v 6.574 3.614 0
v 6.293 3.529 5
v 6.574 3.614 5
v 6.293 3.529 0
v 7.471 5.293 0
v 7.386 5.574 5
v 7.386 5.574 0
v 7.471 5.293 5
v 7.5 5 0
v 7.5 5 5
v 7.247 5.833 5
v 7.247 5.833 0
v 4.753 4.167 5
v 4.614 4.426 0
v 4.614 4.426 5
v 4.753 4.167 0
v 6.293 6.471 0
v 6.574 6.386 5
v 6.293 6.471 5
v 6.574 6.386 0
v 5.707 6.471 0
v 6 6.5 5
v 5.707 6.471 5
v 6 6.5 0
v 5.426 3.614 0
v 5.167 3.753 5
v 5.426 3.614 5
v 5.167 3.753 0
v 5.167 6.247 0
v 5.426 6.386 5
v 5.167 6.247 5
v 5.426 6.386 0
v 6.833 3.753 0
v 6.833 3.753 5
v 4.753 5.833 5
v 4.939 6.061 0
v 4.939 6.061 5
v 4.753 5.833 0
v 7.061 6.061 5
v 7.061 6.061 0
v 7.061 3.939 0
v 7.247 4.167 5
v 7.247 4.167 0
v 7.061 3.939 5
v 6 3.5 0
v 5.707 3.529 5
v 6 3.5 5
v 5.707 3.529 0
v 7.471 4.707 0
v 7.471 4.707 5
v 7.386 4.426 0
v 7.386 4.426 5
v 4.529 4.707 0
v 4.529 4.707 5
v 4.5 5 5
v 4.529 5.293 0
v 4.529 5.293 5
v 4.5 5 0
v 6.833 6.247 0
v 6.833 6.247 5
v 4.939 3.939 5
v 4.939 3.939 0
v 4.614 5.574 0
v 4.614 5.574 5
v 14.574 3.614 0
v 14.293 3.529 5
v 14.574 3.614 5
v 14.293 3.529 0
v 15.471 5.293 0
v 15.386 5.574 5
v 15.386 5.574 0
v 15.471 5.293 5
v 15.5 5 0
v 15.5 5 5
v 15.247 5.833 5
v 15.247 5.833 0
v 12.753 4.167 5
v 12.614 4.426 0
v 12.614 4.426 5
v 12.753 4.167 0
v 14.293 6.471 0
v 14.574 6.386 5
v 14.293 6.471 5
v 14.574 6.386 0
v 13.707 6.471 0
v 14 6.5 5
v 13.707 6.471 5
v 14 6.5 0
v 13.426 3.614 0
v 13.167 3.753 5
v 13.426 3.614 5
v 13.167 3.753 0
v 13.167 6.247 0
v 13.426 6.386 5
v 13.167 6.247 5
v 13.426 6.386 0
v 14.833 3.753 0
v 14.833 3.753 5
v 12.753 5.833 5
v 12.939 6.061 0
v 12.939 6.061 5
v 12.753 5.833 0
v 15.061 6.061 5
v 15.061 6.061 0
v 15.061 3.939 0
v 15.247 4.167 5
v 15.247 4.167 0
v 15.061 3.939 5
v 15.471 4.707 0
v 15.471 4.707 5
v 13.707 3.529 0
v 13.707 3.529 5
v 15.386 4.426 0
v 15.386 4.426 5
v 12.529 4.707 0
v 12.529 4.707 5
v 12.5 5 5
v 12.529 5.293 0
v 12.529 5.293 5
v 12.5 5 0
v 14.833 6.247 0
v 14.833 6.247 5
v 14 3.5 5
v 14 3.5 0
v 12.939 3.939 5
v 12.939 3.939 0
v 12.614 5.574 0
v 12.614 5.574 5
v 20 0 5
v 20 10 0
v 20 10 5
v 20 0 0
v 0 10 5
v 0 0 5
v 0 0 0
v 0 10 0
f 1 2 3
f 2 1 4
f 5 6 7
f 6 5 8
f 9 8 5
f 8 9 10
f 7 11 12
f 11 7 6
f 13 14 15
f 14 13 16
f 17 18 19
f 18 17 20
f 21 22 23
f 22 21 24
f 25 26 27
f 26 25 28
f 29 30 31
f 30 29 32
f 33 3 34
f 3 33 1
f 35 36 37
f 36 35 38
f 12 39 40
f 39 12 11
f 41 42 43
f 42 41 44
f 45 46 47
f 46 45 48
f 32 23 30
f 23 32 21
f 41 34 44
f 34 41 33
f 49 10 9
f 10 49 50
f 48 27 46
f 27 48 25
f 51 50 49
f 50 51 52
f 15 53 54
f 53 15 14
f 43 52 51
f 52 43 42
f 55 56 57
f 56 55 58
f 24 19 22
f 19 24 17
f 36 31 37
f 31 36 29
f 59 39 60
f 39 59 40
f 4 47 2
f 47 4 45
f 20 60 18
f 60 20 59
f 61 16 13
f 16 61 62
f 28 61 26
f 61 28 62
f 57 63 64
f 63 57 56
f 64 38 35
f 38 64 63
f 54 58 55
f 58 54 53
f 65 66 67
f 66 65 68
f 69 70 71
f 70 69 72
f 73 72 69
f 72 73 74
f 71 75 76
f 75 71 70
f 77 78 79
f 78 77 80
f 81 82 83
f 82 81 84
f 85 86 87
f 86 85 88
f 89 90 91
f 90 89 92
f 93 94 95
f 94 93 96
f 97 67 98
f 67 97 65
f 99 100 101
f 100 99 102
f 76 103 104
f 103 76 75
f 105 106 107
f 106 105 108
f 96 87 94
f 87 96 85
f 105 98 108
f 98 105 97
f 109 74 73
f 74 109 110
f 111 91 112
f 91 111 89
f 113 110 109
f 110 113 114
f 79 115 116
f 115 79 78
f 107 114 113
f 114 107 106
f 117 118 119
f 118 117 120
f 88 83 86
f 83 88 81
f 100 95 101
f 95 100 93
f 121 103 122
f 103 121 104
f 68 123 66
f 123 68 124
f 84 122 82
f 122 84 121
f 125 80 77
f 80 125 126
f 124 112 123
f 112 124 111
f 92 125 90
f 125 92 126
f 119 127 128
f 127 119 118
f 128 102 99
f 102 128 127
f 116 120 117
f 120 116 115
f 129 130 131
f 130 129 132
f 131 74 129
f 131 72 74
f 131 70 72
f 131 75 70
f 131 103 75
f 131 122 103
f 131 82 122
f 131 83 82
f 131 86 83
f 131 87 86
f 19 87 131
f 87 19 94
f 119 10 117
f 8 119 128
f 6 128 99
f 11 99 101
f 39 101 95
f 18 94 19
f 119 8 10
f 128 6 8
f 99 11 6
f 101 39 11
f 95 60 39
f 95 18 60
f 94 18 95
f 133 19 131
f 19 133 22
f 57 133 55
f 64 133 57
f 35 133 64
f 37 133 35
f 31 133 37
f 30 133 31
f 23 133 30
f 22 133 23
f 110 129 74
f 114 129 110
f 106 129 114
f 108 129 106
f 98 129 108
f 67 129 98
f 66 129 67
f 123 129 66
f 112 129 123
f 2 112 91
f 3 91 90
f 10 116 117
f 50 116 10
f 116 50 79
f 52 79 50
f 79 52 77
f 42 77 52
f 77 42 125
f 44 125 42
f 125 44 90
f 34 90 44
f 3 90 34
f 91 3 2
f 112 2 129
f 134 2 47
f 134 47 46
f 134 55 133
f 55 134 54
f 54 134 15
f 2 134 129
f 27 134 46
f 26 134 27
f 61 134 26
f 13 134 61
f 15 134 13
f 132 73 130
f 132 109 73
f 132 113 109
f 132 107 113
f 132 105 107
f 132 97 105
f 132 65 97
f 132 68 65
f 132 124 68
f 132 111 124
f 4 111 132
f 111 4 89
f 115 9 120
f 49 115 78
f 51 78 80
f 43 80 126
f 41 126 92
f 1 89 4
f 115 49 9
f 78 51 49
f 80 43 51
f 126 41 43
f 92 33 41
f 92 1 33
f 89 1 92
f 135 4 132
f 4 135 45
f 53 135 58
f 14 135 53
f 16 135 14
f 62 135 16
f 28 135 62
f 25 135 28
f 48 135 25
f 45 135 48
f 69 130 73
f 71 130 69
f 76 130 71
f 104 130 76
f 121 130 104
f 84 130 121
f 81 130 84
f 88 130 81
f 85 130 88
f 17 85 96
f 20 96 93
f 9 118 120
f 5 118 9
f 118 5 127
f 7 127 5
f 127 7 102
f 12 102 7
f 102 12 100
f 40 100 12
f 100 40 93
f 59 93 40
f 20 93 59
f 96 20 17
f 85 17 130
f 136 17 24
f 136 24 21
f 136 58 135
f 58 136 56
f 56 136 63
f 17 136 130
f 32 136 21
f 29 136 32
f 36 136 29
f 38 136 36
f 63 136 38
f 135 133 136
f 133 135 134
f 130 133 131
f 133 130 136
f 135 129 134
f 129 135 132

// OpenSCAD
$fn = 32;

// ----------------------------------------------------------------------
// Micro pad: two-hole pad, 5-20 mm class
// ----------------------------------------------------------------------

// --- parameters (mm) ---
pad_l = 20;               // pad length, X
pad_w = 10;               // pad width, Y
pad_t = 5;                // pad thickness, Z
hole_d = 3;               // hole diameter
hole_x = 6;               // X of the first hole centre

difference() {
  cube([pad_l, pad_w, pad_t]);
  for (x = [hole_x, pad_l - hole_x])
    translate([x, pad_w / 2, -1])
      cylinder(h = pad_t + 2, d = hole_d);
}
